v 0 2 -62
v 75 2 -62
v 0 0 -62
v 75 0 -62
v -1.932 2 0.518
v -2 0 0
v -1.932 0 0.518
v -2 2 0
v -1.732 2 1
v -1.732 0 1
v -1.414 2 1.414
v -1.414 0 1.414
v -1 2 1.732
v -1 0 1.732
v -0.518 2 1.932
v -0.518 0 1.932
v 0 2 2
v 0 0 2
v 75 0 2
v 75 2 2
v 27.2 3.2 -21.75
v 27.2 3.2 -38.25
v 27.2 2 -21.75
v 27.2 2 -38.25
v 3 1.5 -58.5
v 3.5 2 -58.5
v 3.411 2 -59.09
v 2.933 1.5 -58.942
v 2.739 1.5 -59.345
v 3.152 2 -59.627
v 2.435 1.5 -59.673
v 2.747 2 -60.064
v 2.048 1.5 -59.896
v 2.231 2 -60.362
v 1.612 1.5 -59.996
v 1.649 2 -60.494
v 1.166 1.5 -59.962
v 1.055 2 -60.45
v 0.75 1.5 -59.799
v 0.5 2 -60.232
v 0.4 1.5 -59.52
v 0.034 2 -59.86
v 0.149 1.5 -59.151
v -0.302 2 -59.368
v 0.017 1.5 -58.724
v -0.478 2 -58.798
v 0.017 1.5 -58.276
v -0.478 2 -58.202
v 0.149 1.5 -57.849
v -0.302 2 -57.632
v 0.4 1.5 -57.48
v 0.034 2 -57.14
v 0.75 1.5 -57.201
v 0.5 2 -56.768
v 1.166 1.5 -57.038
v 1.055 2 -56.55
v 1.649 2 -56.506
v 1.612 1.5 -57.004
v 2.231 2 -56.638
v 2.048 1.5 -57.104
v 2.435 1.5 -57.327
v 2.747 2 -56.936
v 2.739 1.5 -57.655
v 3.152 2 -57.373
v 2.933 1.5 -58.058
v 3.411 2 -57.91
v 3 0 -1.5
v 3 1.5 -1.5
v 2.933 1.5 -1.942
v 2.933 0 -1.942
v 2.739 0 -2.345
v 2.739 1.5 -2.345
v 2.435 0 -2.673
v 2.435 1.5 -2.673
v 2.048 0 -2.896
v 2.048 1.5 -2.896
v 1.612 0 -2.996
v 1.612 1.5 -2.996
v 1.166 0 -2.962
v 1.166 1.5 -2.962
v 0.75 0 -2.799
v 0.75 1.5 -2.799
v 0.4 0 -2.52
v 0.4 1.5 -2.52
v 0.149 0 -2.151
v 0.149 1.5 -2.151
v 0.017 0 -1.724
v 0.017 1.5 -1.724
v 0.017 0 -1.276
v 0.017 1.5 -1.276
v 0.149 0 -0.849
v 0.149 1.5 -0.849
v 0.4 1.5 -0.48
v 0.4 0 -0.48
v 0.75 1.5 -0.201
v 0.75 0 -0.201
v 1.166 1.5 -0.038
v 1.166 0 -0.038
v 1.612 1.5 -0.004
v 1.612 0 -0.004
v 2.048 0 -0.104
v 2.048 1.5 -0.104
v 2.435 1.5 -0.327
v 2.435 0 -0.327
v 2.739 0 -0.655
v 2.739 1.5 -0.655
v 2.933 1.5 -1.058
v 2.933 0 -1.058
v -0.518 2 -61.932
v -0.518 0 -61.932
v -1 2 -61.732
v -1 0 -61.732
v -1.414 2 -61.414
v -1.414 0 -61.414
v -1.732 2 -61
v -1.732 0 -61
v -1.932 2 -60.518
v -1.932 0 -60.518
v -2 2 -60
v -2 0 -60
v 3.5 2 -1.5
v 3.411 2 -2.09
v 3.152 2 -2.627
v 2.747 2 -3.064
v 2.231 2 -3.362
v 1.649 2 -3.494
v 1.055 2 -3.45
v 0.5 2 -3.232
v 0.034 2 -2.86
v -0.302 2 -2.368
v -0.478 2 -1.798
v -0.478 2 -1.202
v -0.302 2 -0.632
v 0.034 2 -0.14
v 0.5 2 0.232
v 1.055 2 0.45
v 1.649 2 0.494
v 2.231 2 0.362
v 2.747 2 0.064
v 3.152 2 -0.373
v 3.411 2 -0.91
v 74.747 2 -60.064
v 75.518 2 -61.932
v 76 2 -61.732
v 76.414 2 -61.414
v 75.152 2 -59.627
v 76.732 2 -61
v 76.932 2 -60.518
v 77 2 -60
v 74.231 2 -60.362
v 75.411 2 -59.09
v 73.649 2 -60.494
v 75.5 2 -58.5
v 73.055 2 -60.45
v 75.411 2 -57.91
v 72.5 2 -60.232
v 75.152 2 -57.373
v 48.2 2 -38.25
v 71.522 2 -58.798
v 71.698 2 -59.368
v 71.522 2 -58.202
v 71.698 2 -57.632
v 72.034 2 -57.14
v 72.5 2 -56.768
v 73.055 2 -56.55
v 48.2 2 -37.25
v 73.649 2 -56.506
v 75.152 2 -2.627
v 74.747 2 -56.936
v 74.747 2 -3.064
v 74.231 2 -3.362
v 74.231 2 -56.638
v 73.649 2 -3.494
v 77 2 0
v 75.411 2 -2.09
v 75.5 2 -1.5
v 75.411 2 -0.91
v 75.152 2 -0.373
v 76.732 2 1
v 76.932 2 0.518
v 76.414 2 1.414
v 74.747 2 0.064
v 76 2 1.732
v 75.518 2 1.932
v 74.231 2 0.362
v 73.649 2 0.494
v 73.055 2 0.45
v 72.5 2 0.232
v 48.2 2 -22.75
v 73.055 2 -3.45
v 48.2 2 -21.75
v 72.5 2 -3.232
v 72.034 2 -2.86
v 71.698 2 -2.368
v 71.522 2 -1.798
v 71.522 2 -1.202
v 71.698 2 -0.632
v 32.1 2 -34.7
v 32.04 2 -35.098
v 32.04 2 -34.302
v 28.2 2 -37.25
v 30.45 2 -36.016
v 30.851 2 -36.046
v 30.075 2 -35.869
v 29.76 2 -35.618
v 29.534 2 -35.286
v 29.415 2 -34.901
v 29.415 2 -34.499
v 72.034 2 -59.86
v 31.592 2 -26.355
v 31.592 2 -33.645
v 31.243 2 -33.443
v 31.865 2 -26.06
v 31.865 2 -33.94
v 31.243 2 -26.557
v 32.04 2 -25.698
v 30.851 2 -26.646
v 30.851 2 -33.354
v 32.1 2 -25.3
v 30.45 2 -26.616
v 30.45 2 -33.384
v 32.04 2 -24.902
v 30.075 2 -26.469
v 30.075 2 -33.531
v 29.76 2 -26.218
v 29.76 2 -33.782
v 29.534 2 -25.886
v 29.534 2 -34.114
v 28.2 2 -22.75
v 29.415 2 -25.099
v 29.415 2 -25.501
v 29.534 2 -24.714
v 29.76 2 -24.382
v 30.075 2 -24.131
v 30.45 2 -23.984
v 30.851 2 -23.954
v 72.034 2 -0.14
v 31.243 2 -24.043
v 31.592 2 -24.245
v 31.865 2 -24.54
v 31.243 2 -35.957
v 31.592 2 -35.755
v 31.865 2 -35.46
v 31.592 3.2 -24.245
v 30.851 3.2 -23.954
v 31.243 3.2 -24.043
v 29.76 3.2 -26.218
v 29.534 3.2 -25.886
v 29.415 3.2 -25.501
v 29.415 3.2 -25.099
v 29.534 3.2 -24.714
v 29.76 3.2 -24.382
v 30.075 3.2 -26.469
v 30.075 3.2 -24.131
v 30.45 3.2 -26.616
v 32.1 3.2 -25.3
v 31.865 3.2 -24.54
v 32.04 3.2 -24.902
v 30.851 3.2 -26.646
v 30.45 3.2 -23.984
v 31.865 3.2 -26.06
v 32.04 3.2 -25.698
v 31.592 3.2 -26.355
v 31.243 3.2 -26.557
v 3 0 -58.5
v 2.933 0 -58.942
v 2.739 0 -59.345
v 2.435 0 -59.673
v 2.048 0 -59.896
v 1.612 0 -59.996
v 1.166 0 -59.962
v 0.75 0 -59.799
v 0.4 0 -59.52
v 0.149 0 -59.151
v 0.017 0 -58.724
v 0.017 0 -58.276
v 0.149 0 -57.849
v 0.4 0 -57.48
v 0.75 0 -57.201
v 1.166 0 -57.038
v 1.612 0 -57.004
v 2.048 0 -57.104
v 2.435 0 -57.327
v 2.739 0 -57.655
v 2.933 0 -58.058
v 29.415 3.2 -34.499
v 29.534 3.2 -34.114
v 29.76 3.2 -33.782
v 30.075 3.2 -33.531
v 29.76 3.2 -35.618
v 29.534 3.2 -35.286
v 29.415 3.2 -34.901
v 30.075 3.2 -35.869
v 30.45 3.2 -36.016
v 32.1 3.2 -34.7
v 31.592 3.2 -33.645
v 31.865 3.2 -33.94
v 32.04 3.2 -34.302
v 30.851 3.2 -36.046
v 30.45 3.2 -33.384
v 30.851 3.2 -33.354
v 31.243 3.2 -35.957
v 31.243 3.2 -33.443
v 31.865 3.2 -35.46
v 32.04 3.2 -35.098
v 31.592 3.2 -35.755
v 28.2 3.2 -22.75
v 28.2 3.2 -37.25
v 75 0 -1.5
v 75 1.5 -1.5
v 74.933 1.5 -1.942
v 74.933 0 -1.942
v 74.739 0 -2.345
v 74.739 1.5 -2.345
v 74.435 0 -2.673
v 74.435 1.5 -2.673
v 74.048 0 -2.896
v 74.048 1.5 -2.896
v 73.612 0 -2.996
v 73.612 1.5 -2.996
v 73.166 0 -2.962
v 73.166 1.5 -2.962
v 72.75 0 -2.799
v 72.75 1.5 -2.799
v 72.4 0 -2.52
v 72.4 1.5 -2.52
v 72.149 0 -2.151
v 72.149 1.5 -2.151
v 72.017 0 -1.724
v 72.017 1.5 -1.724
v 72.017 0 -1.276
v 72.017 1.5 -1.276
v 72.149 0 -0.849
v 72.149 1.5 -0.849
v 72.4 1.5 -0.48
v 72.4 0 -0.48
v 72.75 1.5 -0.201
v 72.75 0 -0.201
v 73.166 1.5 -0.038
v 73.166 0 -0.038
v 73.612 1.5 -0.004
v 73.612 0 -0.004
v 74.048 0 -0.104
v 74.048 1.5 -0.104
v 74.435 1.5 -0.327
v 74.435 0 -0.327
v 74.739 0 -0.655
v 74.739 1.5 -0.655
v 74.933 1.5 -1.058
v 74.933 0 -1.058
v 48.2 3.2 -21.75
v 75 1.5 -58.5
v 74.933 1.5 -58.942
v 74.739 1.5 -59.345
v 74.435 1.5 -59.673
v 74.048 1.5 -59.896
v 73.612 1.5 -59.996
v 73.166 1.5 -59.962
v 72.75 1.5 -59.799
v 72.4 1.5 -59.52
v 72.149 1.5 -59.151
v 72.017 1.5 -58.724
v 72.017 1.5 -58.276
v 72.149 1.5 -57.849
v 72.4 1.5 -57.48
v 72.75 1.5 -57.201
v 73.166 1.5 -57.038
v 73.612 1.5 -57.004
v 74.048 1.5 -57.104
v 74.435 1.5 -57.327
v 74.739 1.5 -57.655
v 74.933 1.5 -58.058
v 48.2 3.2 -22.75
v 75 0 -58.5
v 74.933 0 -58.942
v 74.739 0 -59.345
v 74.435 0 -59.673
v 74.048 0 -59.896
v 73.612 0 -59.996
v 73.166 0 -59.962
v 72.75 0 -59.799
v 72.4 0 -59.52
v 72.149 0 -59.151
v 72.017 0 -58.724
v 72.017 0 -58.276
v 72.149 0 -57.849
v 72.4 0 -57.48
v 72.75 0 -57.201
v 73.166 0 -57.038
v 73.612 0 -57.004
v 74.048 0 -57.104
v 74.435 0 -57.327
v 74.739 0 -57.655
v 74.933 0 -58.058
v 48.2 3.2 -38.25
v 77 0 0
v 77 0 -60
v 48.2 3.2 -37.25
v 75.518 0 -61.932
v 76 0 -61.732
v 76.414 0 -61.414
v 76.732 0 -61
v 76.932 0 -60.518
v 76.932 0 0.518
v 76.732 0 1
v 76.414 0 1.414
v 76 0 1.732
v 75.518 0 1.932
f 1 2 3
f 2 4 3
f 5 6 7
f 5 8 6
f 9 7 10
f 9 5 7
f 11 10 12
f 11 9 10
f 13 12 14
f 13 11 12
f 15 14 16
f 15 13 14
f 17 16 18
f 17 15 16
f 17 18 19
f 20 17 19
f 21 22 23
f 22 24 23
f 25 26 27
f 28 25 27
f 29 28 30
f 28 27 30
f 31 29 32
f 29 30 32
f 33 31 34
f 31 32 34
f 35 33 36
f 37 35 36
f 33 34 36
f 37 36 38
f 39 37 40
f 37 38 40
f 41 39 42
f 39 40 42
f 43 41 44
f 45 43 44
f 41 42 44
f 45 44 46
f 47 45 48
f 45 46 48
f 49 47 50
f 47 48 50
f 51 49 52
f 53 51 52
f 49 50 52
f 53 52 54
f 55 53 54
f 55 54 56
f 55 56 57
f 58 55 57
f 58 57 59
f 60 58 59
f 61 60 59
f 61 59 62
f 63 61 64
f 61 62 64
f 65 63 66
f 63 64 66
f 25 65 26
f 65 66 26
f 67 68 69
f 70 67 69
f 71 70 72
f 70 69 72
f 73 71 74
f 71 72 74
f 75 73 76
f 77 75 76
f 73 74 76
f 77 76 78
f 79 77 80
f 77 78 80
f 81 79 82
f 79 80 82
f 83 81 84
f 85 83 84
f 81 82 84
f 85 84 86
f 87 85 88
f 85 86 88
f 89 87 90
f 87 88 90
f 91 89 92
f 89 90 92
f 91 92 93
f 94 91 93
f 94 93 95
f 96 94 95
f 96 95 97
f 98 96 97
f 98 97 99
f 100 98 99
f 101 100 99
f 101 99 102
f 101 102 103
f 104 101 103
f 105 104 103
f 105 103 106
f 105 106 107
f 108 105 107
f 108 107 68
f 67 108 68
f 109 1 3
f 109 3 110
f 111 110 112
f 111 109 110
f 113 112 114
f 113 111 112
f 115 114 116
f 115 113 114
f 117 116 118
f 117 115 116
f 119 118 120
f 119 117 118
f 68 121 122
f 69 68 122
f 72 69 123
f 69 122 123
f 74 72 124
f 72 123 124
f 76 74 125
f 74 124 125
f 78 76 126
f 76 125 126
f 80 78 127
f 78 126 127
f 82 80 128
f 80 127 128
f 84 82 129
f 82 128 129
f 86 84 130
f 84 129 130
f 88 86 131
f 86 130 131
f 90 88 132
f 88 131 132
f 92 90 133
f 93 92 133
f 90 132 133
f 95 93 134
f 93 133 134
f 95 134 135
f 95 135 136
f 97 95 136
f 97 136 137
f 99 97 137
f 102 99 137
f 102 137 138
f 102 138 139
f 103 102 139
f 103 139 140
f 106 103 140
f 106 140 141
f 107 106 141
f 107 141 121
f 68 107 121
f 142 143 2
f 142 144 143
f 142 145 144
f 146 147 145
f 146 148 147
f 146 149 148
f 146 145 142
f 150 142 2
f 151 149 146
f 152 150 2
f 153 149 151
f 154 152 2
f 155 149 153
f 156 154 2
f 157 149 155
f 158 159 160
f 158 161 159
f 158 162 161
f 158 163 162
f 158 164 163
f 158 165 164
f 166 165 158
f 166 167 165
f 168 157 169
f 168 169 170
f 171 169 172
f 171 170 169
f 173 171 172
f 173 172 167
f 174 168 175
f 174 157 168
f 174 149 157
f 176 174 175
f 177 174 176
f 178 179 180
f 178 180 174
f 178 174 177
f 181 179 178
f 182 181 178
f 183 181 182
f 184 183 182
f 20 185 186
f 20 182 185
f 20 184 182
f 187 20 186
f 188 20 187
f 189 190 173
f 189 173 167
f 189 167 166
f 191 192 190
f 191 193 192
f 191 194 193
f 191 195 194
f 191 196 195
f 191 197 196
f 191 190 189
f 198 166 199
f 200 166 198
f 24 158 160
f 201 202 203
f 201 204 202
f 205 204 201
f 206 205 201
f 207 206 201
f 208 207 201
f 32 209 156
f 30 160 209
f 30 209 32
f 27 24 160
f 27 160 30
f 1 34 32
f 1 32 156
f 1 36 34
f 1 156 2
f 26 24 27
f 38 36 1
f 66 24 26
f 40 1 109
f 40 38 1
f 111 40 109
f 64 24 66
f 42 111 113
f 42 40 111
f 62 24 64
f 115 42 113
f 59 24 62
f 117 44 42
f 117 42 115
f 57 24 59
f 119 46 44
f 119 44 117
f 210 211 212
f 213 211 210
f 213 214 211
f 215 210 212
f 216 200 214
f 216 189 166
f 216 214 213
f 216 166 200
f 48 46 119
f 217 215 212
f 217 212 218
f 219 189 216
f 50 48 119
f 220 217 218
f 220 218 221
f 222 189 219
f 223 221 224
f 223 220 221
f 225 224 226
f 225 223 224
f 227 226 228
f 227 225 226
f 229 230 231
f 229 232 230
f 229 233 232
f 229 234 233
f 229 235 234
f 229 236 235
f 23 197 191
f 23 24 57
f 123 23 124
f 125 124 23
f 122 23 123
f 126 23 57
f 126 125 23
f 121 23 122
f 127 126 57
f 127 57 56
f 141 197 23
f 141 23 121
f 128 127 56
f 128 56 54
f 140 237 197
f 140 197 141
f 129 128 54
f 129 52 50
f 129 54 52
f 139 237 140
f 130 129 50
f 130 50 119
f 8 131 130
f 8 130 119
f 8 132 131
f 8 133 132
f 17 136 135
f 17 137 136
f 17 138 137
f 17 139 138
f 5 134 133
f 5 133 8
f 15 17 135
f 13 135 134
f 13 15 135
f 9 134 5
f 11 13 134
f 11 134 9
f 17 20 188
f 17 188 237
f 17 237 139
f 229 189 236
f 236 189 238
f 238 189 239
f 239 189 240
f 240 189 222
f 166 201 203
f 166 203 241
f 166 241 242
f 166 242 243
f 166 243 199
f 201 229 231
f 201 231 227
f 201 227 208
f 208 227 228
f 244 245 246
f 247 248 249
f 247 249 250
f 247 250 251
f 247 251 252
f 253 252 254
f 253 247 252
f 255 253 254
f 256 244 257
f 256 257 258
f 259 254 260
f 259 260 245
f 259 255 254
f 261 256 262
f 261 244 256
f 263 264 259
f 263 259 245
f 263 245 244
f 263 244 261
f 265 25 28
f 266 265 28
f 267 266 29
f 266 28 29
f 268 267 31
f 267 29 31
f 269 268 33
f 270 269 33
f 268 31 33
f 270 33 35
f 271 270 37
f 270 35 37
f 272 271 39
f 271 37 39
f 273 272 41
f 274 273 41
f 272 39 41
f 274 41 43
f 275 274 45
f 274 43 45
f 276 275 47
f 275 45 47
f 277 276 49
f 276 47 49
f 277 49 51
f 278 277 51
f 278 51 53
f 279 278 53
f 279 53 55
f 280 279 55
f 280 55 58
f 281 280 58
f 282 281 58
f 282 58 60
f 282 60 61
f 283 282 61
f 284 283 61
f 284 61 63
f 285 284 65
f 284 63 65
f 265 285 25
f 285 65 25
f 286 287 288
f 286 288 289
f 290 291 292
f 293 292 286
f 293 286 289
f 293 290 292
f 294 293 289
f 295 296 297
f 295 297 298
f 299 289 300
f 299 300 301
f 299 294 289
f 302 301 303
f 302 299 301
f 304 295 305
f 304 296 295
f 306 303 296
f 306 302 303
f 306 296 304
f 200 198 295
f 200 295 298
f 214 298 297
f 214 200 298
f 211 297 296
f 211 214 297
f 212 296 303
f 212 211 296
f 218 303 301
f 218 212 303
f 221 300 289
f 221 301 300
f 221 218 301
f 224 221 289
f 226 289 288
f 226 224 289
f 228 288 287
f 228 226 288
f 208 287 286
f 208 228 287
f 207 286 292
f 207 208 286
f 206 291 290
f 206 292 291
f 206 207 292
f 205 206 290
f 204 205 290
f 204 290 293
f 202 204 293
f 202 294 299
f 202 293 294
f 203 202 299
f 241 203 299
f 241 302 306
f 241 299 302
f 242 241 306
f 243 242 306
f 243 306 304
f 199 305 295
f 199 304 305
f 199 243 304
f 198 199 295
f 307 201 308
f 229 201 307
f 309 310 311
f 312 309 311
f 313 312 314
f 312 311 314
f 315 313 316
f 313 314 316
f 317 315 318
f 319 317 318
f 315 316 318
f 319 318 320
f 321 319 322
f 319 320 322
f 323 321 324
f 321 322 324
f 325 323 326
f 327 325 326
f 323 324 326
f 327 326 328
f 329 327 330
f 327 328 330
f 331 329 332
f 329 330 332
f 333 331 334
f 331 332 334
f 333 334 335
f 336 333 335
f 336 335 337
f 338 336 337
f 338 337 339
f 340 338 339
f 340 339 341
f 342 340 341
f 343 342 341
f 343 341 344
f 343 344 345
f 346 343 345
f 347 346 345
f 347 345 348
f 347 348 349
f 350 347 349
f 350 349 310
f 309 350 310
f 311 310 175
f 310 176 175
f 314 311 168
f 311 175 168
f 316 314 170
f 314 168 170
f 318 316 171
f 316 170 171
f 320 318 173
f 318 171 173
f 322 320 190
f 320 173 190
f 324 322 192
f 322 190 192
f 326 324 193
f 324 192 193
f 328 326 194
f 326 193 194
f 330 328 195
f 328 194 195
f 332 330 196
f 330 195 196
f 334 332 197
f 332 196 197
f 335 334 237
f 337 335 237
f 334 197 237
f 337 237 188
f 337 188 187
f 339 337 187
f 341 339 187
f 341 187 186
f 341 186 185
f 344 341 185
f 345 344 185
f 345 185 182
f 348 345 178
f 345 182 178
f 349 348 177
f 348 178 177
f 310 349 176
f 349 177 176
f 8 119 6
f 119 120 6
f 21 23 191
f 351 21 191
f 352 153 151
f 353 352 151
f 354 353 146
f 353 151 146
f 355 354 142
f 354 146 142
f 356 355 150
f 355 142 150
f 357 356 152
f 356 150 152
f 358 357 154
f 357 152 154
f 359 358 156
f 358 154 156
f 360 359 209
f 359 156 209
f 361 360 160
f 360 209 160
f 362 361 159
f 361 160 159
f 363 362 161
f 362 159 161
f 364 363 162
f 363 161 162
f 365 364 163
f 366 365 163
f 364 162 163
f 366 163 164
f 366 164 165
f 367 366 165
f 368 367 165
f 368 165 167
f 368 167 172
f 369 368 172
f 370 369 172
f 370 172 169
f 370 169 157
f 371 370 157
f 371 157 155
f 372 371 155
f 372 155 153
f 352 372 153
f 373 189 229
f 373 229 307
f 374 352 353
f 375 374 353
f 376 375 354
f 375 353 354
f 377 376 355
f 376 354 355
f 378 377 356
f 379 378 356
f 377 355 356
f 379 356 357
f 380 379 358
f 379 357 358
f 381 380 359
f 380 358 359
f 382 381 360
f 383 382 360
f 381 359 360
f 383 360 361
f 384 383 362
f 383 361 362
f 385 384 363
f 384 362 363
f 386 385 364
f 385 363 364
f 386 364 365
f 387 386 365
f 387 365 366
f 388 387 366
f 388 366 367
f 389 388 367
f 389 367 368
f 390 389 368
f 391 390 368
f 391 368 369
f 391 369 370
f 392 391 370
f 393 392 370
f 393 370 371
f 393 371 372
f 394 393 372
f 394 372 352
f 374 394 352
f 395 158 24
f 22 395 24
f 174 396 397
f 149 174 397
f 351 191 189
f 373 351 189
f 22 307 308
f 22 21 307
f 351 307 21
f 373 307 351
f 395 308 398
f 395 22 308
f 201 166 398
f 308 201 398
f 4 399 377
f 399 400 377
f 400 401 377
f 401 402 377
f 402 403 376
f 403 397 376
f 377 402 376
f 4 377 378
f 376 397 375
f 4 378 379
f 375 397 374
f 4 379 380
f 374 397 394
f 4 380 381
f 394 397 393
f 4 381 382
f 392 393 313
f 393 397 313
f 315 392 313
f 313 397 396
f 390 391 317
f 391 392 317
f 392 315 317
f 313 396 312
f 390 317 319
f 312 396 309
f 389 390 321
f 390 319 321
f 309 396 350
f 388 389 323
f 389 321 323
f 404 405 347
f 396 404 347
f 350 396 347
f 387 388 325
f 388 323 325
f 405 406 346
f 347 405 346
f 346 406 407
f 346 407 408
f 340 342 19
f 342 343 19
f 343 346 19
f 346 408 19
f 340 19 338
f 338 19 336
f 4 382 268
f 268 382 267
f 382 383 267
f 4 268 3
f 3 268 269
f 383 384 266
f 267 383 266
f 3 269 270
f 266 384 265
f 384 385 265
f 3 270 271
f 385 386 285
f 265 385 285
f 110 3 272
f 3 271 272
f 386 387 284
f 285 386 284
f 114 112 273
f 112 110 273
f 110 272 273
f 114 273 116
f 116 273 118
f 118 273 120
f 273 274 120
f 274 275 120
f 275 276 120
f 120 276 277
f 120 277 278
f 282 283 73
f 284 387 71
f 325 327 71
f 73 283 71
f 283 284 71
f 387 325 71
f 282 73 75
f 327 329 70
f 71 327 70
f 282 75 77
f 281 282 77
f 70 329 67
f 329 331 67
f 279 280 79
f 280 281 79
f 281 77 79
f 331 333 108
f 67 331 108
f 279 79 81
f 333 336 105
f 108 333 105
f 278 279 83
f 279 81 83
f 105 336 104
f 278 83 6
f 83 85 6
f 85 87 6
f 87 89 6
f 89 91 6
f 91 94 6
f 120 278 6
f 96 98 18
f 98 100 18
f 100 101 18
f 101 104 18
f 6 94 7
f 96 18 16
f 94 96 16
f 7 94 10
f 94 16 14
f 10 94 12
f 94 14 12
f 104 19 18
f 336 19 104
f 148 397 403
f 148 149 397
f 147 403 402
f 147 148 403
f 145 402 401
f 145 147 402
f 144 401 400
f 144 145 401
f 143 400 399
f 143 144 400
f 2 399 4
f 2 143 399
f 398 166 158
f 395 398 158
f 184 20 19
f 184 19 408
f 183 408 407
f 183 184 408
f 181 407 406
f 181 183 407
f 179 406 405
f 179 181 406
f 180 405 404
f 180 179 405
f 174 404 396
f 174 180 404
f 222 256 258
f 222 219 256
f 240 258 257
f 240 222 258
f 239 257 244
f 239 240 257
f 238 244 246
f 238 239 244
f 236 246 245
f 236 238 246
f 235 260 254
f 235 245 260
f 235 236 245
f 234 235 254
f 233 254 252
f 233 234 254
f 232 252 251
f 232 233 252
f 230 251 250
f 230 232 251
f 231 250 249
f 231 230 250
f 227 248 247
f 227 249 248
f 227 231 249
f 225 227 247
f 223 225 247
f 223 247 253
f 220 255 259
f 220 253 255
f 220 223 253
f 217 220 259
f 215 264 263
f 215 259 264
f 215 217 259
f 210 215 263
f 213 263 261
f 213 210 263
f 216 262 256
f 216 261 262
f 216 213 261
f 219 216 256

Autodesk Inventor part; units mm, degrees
ref_plane "YZ Plane" through (0, 0, 0) normal (1, 0, 0) x (0, 1, 0)
ref_plane "XZ Plane" through (0, 0, 0) normal (0, 1, 0) x (-1, 0, 0)
ref_plane "XY Plane" through (0, 0, 0) normal (0, 0, 1) x (1, 0, 0)
sketch "Náčrt1" plane through (0, 0, 0) normal (0, 1, 0) x (-1, 0, 0)
  line L0 (0, 0) -> (-75, 0)
  line L1 (-75, 0) -> (-75, -60)
  line L2 (-75, -60) -> (0, -60)
  line L3 (0, -60) -> (0, 0)
  line L4 (2, 2) -> (-77, 2)
  line L5 (-77, 2) -> (-77, -62)
  line L6 (-77, -62) -> (2, -62)
  line L7 (2, -62) -> (2, 2)
  dimension "d0" = 2
  dimension "d1" = 2
  dimension "d2" = 2
  dimension "d3" = 2
  dimension "d4" = 75
  dimension "d5" = 60
extrude "Vysunutí1" add sketch "Náčrt1" along normal blind 2 contours L3 L2 L1 L0 | L7 L6 L5 L4
sketch "Náčrt2" plane through (0, 2, 0) normal (0, 1, 0) x (1, 0, 0)
  circle A0 centre (1.5, 1.5) radius 1.5
  circle A1 centre (1.5, 58.5) radius 1.5
  circle A2 centre (73.5, 58.5) radius 1.5
  circle A3 centre (73.5, 1.5) radius 1.5
  line L0 (-2, 62) -> (-2, -2) projected
  line L1 (-2, -2) -> (77, -2) projected
  line L2 (77, 62) -> (-2, 62) projected
  line L3 (77, -2) -> (77, 62) projected
  point P0 (0, 0)
  dimension "d8" = 3
  dimension "d9" = 3
  dimension "d10" = 3
  dimension "d11" = 3
  dimension "d12" = 3.5
  dimension "d13" = 3.5
  dimension "d14" = 3.5
  dimension "d15" = 3.5
  dimension "d16" = 3.5
  dimension "d17" = 3.5
  dimension "d18" = 3.5
  dimension "d19" = 3.5
extrude "Vysunutí2" cut sketch "Náčrt2" against normal blind 2 contours A0 | A1 | A2 | A3
chamfer "Zkosení1" distance 0.5 angle 45 4 edges at (0, 2, -1.5) (0, 2, -58.5) (72, 2, -58.5) (72, 2, -1.5)
fillet "Zaoblení1" radius 2 4 edges at (77, 1, 2) (77, 1, -62) (-2, 1, -62) (-2, 1, 2)
sketch "Náčrt3" plane through (0, 2, 0) normal (0, 1, 0) x (1, 0, 0)
  line L0 (28.2, 22.75) -> (47.2, 22.75)
  line L1 (47.2, 22.75) -> (47.2, 37.25)
  line L2 (47.2, 37.25) -> (28.2, 37.25)
  line L3 (28.2, 37.25) -> (28.2, 22.75)
  circle A0 centre (30.75, 25.3) radius 1.35
  circle A1 centre (30.75, 34.7) radius 1.35
  line L4 (0, -2) -> (75, -2) projected
  line L5 (-2, 60) -> (-2, 0) projected
  line L6 (77, 0) -> (77, 60) projected
  line L7 (27.2, 21.75) -> (48.2, 21.75)
  line L8 (48.2, 21.75) -> (48.2, 38.25)
  line L9 (48.2, 38.25) -> (27.2, 38.25)
  line L10 (27.2, 38.25) -> (27.2, 21.75)
  point P0 (0, 0)
  dimension "d26" = 14.5
  dimension "d27" = 19
  dimension "d28" = 2.55
  dimension "d29" = 2.7
  dimension "d30" = 2.55
  dimension "d31" = 2.7
  dimension "d32" = 2.55
  dimension "d33" = 2.55
  dimension "d34" = 24.75
  dimension "d35" = 30.2
  dimension "d36" = 79
  dimension "d37" = 1
  dimension "d38" = 1
  dimension "d39" = 1
  dimension "d40" = 1
  dimension "d47" = 9.4
extrude "Vysunutí3" add sketch "Náčrt3" along normal blind 1.2 contours L10 L9 L8 L7
extrude "Vysunutí4" add sketch "Náčrt3" along normal blind 1.2 contours A0 | A1
sketch "Náčrt4" plane through (48.2, 2, -21.75) normal (1, 0, 0) x (0, 0, -1)
  line L0 (1, 0) -> (1, 1.2) projected
  line L1 (15.5, 0) -> (15.5, 1.2) projected
  line L2 (1, 1.2) -> (15.5, 1.2)
  line L3 (15.5, 1.2) -> (15.5, 0)
  line L4 (15.5, 0) -> (1, 0)
  line L5 (1, 0) -> (1, 1.2)
  point P0 (-21.75, -2)
extrude "Vysunutí5" cut sketch "Náčrt4" against normal blind 1.2
equation "\"d1\" = d0"
equation "\"d2\" = d0"
equation "\"d3\" = d0"
equation "\"d9\" = d8"
equation "\"d10\" = d8"
equation "\"d11\" = d8"
equation "\"d14\" = d12"
equation "\"d15\" = d12"
equation "\"d16\" = d12"
equation "\"d17\" = d12"
equation "\"d18\" = d12"
equation "\"d19\" = d12"
equation "\"d32\" = d30"
equation "\"d33\" = d28"
equation "\"d38\" = d37"
equation "\"d39\" = d37"
equation "\"d40\" = d37"
properties part number "BH1750-viko"
